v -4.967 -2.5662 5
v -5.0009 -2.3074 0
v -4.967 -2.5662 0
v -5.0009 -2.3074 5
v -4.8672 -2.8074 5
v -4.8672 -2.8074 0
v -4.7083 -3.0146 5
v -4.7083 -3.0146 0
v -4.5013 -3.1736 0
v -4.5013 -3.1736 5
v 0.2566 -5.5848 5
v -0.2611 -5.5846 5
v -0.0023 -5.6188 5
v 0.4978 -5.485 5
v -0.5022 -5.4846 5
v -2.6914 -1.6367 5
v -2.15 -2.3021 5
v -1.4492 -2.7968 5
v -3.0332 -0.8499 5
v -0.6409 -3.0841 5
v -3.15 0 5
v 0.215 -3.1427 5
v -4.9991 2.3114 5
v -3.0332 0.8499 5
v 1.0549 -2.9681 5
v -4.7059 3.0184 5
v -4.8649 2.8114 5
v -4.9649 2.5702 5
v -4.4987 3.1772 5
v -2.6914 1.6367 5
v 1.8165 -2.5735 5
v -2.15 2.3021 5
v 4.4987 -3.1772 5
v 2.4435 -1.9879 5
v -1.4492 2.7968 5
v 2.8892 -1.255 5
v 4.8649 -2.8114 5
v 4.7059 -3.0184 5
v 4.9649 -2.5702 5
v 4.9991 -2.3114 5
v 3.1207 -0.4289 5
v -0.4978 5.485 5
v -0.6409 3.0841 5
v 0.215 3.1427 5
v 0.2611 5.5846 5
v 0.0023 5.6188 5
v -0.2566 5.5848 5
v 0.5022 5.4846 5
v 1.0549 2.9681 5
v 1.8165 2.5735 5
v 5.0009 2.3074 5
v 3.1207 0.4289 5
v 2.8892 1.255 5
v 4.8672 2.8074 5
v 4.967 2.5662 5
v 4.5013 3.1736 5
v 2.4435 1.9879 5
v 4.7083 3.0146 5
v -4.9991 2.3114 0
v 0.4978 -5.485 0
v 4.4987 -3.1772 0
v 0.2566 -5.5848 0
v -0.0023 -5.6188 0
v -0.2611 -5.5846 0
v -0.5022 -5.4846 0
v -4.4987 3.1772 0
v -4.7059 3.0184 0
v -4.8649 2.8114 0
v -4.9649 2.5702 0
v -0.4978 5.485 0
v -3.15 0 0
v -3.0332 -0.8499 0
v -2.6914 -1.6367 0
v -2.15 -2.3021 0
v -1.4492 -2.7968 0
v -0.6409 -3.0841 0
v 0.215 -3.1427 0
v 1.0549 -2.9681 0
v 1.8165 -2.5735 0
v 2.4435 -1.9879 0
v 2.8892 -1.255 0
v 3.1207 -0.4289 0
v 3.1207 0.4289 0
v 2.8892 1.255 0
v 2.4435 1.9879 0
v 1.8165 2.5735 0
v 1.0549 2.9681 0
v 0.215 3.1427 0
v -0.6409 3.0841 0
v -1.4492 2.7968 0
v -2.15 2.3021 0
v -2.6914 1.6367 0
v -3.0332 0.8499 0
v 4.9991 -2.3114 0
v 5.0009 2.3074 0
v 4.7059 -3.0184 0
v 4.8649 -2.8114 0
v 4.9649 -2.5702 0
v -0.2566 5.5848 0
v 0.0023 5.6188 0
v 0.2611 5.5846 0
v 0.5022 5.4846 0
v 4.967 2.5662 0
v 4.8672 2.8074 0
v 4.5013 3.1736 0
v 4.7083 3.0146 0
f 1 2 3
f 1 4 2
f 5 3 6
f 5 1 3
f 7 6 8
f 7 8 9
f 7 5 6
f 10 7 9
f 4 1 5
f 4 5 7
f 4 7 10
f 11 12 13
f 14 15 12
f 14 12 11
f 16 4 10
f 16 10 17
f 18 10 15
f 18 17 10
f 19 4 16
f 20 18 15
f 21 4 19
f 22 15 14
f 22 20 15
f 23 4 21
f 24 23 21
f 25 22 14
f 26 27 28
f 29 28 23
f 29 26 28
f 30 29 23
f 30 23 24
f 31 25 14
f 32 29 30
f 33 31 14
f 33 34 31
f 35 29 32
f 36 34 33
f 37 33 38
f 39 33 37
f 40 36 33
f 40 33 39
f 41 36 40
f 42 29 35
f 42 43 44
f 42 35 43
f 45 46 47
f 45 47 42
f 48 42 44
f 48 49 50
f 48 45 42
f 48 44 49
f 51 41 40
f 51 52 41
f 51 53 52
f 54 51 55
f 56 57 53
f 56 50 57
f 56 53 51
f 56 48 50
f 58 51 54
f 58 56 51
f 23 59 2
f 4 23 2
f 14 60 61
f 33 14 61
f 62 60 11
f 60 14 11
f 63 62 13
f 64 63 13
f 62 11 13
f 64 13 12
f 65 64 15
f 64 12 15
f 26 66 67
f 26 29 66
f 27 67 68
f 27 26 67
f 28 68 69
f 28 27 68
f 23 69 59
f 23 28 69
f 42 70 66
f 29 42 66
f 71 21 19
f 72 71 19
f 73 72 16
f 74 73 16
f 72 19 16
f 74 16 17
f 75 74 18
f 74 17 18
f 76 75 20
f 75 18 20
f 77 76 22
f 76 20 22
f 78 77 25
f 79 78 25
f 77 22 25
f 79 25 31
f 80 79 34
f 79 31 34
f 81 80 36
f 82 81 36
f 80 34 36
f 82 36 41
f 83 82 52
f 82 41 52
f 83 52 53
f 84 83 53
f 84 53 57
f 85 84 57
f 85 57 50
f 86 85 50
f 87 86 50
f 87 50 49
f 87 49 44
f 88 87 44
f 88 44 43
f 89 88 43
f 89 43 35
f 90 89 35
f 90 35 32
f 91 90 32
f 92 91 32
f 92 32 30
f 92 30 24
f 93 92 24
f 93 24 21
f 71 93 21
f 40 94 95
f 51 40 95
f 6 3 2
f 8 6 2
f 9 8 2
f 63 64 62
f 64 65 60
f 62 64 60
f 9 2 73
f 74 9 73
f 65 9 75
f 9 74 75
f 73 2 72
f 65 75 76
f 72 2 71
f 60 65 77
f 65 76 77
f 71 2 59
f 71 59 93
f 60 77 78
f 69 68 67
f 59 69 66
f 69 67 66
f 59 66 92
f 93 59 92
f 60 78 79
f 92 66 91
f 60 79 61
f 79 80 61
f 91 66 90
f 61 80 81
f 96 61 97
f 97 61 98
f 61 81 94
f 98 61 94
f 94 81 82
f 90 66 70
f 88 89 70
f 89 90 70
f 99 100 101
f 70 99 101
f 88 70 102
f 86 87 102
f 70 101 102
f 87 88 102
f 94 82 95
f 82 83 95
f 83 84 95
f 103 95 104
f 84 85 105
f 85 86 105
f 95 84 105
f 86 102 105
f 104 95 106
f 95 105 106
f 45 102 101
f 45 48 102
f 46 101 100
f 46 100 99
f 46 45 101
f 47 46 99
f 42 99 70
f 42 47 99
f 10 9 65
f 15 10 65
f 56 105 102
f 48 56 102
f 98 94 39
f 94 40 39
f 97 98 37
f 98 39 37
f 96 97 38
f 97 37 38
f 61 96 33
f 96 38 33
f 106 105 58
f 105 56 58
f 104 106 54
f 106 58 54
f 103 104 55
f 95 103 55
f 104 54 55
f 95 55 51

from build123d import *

# Parameters (mm, degrees)
F1_DEPTH = 5
F2_D     = 6.3
F3_R     = 1


with BuildPart() as f1:
    # F0 (on Top) → F1 (new body)
    with BuildSketch(Plane.XY):
        Polygon((5.0011666315, 2.8847297373), (0.0023340802, 5.7735022201), (-4.9988325513, 2.8887724828), (-5.0011666315, -2.8847297373), (-0.0023340802, -5.7735022201), (4.9988325513, -2.8887724828), align=None)
    extrude(amount=F1_DEPTH)

    # F2 (through all)
    with Locations(Plane(origin=(0, 0, 0), x_dir=(1, 0, 0), z_dir=(0, 0, -1))):
        with Locations((0, 0)):
            Hole(F2_D / 2)

    # F3
    f3_edges = [f1.edges().sort_by_distance(p)[0] for p in [
        (-0.002334, -5.773502, 2.5),
        (4.998833, -2.888772, 2.5),
        (5.001167, 2.88473, 2.5),
        (0.002334, 5.773502, 2.5),
        (-4.998833, 2.888772, 2.5),
        (-5.001167, -2.88473, 2.5),
    ]]
    fillet(f3_edges, radius=F3_R)


solid = f1.part
